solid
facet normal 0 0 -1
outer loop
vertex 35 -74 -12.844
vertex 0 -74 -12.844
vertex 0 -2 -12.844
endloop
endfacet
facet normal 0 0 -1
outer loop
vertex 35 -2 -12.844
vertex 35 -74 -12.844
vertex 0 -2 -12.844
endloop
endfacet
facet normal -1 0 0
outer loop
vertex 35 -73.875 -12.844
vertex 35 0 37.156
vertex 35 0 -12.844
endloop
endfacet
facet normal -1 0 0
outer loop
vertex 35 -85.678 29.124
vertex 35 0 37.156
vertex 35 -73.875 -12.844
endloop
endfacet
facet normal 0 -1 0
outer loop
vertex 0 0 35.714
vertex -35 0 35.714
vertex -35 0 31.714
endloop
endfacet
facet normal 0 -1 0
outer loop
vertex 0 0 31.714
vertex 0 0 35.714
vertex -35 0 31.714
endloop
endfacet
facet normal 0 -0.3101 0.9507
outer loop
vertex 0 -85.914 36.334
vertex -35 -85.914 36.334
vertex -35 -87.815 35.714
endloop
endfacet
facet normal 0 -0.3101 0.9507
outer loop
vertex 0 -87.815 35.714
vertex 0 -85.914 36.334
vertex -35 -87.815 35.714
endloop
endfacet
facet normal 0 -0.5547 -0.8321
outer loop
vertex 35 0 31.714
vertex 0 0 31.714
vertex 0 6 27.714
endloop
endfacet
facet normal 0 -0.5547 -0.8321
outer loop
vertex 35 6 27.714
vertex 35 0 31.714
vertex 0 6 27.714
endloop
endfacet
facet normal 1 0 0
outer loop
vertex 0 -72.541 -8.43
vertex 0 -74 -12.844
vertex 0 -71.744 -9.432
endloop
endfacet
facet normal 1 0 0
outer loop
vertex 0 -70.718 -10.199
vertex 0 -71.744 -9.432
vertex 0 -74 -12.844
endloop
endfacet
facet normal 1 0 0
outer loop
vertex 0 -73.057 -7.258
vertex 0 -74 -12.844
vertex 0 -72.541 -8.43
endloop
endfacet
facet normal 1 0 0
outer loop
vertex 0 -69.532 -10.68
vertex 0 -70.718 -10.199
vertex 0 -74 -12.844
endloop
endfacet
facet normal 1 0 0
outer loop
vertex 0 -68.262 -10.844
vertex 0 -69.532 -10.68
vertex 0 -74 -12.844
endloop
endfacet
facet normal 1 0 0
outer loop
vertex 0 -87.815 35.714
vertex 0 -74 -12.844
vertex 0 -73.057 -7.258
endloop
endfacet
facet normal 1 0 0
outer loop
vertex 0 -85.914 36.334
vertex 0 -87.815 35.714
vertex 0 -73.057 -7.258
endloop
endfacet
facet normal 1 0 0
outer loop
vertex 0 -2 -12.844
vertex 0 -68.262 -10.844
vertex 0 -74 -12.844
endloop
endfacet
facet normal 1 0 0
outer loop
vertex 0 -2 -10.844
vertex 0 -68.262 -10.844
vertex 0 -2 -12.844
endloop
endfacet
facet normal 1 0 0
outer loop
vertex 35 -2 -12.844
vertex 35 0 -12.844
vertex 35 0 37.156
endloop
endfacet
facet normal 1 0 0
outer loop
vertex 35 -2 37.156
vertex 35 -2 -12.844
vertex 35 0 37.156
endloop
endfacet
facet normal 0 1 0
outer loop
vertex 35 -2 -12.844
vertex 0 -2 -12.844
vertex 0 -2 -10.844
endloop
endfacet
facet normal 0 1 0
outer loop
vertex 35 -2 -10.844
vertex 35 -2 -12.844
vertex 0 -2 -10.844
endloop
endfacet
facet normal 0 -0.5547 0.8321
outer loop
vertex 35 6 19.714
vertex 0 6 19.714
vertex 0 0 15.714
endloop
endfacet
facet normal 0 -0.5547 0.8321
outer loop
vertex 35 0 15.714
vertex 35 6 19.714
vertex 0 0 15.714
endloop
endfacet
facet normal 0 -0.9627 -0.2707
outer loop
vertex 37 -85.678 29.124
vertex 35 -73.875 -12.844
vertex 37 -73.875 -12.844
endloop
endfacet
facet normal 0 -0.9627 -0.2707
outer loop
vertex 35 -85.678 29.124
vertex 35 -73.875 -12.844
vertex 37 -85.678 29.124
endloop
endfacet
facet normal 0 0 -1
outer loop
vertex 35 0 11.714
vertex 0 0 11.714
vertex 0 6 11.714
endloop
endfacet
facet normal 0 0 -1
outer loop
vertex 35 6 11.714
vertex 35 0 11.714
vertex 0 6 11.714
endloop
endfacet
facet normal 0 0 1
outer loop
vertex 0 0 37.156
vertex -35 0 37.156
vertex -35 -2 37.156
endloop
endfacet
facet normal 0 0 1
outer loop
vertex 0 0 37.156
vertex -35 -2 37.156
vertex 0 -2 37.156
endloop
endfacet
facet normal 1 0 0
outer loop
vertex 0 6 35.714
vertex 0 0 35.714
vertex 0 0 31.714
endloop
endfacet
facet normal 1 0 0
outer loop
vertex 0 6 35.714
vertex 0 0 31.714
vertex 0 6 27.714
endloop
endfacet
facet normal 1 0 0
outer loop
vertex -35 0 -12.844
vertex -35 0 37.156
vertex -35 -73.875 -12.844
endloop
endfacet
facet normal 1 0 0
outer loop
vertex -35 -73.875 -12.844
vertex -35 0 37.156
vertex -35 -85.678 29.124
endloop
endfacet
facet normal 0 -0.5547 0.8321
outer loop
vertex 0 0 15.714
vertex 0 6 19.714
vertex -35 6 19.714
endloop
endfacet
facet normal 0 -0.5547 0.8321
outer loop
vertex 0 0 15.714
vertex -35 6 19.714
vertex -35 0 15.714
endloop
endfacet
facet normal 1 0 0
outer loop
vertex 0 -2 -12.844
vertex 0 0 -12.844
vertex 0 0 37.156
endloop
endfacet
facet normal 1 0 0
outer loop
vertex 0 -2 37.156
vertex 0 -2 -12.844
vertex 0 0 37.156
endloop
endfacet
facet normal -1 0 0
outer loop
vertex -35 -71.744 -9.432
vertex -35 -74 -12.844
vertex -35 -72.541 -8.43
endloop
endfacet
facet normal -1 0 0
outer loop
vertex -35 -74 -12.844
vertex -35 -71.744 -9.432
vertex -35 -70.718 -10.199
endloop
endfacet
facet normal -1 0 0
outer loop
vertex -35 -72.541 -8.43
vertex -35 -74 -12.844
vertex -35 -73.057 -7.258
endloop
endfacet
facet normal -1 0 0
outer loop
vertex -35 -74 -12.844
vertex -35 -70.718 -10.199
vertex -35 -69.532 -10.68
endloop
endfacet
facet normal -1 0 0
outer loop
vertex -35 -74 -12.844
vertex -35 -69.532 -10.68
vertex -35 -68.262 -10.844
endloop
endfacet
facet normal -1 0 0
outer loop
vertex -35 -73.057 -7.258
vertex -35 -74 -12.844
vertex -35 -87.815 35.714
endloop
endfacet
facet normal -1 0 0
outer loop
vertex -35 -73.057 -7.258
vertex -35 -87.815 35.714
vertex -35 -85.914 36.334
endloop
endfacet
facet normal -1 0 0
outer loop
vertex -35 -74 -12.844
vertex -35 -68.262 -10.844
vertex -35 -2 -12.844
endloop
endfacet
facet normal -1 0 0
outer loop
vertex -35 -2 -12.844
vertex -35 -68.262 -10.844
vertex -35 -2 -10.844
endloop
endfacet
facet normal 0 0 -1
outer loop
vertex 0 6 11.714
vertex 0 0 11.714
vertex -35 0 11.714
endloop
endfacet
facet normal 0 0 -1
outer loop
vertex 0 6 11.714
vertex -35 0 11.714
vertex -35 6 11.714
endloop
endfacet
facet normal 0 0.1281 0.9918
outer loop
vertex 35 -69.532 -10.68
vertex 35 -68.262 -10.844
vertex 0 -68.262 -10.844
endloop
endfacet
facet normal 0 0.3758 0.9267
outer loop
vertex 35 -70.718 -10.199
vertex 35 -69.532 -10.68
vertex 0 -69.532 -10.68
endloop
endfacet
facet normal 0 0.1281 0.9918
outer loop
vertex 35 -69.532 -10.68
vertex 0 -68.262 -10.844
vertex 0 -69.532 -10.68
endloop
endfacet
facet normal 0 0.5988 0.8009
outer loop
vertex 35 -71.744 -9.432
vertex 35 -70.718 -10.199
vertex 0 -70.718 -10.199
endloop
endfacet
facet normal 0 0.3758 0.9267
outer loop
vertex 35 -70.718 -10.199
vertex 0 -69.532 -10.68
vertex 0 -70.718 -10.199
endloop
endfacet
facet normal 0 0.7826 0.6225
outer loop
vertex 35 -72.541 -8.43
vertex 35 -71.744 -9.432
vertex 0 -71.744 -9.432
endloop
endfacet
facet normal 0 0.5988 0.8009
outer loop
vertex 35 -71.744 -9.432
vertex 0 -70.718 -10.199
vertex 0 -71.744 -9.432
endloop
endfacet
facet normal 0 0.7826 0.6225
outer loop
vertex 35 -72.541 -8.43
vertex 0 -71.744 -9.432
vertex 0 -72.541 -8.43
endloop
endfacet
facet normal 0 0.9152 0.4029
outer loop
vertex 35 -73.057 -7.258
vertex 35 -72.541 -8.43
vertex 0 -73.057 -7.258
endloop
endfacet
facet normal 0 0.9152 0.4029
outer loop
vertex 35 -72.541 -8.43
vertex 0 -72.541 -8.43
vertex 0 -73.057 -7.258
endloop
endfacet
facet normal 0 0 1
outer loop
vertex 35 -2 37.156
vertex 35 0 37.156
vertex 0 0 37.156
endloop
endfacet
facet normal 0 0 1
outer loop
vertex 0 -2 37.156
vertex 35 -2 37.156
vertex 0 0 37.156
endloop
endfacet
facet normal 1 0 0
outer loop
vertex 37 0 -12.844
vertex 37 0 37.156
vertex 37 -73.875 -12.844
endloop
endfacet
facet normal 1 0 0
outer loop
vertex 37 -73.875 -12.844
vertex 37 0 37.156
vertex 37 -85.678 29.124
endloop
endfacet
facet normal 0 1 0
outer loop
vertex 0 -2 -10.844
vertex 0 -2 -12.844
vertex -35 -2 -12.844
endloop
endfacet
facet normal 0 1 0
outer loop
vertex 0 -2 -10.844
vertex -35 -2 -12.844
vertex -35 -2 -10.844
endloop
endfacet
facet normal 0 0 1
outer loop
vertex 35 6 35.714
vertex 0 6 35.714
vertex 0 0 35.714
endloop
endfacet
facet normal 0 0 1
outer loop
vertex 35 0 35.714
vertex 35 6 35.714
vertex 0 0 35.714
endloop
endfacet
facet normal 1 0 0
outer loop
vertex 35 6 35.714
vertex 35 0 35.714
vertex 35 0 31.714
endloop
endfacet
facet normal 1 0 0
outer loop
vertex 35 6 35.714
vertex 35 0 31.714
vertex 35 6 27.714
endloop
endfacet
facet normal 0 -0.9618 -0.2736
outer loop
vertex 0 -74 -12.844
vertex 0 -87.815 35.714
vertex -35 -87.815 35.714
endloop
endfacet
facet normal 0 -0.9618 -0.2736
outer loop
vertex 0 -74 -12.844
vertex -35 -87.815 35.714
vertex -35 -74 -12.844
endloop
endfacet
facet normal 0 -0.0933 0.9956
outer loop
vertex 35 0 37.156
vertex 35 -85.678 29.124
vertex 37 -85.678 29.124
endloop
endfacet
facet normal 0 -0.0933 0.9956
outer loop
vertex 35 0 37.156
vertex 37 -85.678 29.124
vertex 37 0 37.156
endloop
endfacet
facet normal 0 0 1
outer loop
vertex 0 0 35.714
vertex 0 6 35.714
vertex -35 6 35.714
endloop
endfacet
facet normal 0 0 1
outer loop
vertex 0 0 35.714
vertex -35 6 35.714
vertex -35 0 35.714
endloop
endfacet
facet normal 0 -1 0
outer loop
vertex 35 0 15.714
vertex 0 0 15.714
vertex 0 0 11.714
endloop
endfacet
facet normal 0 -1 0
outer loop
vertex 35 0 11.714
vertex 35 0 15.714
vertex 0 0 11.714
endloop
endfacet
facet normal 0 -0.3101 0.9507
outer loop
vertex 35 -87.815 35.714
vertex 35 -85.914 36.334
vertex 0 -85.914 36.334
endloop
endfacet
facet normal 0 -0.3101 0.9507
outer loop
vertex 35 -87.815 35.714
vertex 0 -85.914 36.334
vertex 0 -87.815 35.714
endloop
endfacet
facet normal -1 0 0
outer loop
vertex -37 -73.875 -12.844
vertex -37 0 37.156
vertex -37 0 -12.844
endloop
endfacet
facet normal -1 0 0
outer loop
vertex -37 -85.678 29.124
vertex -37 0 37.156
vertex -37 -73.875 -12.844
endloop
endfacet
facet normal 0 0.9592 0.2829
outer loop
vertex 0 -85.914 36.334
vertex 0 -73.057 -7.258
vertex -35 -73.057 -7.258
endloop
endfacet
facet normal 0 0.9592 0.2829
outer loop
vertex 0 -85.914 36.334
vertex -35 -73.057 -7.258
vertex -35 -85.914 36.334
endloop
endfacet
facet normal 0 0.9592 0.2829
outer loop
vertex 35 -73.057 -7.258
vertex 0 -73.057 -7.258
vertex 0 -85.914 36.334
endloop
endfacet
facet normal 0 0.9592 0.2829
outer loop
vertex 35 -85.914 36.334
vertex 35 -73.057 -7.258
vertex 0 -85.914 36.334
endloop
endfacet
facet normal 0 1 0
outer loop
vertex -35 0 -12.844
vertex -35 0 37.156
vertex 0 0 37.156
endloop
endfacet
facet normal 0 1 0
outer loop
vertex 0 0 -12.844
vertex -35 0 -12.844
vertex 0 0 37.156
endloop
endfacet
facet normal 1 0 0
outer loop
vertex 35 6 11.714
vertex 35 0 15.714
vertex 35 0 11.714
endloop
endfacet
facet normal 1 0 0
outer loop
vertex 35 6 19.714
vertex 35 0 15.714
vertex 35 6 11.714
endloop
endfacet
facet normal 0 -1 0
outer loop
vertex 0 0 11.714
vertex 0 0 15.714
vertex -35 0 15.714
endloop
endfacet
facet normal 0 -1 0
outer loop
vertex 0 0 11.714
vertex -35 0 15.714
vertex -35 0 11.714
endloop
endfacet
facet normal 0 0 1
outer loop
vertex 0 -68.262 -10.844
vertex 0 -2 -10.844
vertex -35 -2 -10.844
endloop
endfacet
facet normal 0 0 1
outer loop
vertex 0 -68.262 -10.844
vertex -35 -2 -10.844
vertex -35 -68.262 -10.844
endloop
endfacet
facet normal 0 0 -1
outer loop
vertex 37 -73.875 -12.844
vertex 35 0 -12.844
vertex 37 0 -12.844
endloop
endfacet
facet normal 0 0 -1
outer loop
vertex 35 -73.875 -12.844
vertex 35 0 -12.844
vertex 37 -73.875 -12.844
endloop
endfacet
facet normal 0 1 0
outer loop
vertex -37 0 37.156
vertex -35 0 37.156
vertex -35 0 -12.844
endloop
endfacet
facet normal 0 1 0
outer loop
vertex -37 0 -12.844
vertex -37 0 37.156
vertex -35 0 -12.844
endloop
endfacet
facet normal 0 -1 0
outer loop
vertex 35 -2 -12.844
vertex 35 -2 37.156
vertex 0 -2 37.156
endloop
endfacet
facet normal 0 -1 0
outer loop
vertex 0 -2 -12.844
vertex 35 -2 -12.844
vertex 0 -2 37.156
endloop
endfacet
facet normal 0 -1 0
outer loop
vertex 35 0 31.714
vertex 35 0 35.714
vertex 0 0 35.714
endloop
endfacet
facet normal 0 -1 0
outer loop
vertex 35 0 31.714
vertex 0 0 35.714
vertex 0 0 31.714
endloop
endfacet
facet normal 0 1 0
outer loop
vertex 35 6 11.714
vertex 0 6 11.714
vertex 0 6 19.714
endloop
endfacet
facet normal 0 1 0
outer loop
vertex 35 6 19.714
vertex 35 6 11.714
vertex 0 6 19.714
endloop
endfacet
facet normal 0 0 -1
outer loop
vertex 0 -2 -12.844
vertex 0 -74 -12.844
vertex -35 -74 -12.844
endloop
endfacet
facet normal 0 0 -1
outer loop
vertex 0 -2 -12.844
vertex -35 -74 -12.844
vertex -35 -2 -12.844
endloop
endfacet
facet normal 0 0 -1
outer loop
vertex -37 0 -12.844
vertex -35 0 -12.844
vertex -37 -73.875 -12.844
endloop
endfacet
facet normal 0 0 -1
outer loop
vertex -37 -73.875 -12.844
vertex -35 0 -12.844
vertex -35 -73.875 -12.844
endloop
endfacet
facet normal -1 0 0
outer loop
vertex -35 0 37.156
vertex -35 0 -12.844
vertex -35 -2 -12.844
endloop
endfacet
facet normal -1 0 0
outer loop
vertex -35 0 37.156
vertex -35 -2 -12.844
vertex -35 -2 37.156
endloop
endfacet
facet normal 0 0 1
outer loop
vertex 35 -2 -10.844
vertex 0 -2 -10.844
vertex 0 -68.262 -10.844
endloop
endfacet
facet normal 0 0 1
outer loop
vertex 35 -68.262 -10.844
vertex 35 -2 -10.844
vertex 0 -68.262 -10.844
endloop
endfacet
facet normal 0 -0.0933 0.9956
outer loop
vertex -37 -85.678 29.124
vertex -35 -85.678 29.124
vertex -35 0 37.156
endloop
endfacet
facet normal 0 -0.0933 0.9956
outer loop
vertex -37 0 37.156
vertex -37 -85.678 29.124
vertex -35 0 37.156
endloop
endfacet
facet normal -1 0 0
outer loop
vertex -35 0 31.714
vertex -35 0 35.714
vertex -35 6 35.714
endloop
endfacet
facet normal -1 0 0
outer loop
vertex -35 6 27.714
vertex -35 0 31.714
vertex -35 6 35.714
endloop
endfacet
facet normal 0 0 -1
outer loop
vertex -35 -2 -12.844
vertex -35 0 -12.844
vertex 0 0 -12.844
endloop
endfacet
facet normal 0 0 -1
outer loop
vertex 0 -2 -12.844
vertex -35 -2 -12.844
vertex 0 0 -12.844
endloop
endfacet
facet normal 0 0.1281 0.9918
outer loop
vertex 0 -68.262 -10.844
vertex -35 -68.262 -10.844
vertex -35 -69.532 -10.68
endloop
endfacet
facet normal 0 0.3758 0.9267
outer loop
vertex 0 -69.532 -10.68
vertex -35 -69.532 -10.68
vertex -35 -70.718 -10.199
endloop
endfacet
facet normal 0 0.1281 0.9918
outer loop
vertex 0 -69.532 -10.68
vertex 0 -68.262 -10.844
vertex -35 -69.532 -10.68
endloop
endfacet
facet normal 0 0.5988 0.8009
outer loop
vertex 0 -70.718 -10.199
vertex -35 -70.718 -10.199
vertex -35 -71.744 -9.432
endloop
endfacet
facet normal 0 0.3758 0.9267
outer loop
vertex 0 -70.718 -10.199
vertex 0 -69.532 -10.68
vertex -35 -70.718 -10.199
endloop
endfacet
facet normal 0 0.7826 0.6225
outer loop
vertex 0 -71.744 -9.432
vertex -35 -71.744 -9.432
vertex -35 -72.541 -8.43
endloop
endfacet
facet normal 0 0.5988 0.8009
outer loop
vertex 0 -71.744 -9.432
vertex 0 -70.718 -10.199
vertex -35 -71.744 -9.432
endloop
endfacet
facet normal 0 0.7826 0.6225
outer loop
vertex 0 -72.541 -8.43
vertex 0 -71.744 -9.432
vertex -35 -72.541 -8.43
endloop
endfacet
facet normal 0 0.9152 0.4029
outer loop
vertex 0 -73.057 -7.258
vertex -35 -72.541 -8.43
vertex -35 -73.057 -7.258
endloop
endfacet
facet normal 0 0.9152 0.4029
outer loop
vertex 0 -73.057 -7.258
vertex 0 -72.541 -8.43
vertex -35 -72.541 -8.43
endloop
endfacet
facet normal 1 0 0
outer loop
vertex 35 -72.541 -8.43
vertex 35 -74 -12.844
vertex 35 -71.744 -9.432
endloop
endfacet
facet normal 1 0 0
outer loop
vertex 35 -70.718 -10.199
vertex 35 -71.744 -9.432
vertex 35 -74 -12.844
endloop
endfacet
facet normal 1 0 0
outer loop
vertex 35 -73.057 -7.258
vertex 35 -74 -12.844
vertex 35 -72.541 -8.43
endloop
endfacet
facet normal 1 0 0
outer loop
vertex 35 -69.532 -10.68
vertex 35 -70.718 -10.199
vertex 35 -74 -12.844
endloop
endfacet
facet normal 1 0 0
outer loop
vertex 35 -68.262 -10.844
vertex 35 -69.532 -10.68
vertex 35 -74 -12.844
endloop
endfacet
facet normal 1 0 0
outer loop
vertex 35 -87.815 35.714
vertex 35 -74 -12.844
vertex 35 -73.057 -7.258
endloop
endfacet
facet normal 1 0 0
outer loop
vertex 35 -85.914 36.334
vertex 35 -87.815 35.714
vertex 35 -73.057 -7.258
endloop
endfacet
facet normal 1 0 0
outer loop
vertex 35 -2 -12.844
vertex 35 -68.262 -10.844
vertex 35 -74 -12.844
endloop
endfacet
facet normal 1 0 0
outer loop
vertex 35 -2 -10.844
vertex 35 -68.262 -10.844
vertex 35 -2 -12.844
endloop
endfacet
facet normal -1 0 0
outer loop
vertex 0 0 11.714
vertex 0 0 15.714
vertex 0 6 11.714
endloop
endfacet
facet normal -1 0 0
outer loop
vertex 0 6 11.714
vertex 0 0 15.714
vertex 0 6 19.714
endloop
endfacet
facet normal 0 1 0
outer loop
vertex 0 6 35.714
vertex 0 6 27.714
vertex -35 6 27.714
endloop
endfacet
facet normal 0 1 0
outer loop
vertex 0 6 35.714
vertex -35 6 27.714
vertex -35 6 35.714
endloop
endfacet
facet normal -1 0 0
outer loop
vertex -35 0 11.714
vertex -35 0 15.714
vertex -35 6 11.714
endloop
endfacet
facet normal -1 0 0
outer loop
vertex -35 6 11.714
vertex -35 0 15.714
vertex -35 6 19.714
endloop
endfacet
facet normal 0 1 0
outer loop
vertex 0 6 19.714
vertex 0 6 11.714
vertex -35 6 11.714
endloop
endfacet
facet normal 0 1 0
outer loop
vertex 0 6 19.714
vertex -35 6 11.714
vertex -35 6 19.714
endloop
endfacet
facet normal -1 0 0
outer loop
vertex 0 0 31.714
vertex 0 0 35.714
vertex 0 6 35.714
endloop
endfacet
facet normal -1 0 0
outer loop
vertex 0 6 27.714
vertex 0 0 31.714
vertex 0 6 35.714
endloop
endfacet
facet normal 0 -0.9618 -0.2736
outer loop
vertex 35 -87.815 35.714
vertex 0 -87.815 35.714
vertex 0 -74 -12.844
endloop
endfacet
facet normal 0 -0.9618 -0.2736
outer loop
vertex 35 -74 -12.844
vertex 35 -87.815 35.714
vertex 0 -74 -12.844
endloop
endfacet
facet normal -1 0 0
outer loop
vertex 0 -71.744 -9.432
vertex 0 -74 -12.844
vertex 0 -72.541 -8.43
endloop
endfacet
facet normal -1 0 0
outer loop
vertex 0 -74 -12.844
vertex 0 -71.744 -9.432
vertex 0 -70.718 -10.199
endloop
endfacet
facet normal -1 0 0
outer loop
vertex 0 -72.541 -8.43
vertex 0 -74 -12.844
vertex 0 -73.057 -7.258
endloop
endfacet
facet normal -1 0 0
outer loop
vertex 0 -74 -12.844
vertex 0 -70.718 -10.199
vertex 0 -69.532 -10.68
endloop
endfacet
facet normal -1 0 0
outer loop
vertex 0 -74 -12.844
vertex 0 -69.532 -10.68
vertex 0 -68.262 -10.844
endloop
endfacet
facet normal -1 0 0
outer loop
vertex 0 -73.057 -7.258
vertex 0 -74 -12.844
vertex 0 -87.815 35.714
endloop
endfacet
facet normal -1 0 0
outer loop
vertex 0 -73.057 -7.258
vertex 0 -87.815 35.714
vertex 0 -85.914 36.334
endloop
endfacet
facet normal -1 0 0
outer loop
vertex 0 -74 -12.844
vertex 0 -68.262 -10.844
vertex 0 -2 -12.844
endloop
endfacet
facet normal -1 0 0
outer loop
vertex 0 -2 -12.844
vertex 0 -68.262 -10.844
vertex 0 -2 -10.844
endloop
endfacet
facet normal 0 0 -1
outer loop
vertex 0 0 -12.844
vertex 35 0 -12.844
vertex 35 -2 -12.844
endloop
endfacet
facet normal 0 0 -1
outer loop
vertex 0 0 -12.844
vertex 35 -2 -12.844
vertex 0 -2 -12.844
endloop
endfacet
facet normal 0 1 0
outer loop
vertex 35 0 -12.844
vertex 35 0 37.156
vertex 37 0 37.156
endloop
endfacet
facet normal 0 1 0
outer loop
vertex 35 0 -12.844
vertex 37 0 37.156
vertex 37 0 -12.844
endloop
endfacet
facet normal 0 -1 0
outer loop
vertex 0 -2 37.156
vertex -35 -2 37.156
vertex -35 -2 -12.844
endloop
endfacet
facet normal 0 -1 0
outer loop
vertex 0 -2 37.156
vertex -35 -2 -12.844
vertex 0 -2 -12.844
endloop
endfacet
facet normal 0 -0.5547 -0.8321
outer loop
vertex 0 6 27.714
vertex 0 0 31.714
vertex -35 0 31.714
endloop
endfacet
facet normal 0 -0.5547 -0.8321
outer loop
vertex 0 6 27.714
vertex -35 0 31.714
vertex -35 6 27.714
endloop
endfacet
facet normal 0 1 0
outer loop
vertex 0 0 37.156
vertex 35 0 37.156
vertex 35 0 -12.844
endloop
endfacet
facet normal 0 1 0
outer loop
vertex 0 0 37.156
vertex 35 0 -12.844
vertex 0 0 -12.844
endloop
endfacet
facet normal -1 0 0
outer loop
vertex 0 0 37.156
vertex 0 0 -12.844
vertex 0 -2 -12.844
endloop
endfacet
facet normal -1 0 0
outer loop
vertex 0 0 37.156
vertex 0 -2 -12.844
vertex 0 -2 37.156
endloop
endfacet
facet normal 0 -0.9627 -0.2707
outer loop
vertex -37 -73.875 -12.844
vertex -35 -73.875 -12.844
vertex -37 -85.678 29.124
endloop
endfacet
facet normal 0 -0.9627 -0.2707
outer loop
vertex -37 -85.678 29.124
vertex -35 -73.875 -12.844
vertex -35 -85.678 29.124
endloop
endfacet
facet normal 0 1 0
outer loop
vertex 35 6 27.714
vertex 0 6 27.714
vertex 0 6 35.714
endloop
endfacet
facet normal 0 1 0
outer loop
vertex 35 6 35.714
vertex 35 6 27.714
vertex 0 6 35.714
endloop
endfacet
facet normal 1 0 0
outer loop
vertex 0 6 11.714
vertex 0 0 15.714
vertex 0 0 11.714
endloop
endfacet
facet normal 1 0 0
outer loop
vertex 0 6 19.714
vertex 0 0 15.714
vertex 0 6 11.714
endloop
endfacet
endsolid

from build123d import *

# Parameters (mm, degrees)
F0_W     = 35
F0_H     = 50
F1_DEPTH = 2
F3_DEPTH = 35
F5_DEPTH = 2


with BuildPart() as f1:
    # F0 (on Front) → F1 (new body)
    with BuildSketch(Plane.XZ):
        with Locations((-17.5, 12.155963)):
            Rectangle(F0_W, F0_H)
    extrude(amount=F1_DEPTH)


with BuildPart() as f3:
    # F2 (on Right) → F3 (new body)
    with BuildSketch(Plane.YZ):
        Polygon((6, 35.714177), (0, 35.714177), (0, 31.714177), (6, 27.714175), align=None)
        Polygon((6, 11.714175), (6, 19.714175), (0, 15.714174), (0, 11.714175), align=None)
        with BuildLine():
            Line((-72, -12.844037), (-2, -12.844037))
            Line((-2, -12.844037), (-2, -10.844037))
            Line((-2, -10.844037), (-68.26169, -10.844037))
            ThreePointArc((-68.26169, -10.844037), (-71.255695, -9.848527), (-73.057474, -7.258411))
            Line((-73.057474, -7.258411), (-85.913629, 36.33355))
            Line((-85.913629, 36.33355), (-87.815307, 35.714177))
            Line((-87.815307, 35.714177), (-74, -12.844037))
            Line((-74, -12.844037), (-72, -12.844037))
        make_face()
    extrude(amount=-F3_DEPTH)


with BuildPart() as f5:
    # F4 (on face) → F5 (new body)
    with BuildSketch(Plane(origin=(-35, 0, 0), x_dir=(0, -1, 0), z_dir=(-1, 0, 0))):
        Polygon((85.677773, 29.123848), (0, 37.155963), (0, -12.844037), (73.875137, -12.844037), align=None)
    extrude(amount=F5_DEPTH)


with BuildPart() as f6_1:
    # F6: instance of F5
    add(f5.part.mirror(Plane.YZ))


with BuildPart() as f6_2:
    # F6: instance of F3
    add(f3.part.mirror(Plane.YZ))


with BuildPart() as f6_3:
    # F6: instance of F1
    add(f1.part.mirror(Plane.YZ))


solid = Compound([f1.part, f3.part, f5.part, f6_1.part, f6_2.part, f6_3.part])
